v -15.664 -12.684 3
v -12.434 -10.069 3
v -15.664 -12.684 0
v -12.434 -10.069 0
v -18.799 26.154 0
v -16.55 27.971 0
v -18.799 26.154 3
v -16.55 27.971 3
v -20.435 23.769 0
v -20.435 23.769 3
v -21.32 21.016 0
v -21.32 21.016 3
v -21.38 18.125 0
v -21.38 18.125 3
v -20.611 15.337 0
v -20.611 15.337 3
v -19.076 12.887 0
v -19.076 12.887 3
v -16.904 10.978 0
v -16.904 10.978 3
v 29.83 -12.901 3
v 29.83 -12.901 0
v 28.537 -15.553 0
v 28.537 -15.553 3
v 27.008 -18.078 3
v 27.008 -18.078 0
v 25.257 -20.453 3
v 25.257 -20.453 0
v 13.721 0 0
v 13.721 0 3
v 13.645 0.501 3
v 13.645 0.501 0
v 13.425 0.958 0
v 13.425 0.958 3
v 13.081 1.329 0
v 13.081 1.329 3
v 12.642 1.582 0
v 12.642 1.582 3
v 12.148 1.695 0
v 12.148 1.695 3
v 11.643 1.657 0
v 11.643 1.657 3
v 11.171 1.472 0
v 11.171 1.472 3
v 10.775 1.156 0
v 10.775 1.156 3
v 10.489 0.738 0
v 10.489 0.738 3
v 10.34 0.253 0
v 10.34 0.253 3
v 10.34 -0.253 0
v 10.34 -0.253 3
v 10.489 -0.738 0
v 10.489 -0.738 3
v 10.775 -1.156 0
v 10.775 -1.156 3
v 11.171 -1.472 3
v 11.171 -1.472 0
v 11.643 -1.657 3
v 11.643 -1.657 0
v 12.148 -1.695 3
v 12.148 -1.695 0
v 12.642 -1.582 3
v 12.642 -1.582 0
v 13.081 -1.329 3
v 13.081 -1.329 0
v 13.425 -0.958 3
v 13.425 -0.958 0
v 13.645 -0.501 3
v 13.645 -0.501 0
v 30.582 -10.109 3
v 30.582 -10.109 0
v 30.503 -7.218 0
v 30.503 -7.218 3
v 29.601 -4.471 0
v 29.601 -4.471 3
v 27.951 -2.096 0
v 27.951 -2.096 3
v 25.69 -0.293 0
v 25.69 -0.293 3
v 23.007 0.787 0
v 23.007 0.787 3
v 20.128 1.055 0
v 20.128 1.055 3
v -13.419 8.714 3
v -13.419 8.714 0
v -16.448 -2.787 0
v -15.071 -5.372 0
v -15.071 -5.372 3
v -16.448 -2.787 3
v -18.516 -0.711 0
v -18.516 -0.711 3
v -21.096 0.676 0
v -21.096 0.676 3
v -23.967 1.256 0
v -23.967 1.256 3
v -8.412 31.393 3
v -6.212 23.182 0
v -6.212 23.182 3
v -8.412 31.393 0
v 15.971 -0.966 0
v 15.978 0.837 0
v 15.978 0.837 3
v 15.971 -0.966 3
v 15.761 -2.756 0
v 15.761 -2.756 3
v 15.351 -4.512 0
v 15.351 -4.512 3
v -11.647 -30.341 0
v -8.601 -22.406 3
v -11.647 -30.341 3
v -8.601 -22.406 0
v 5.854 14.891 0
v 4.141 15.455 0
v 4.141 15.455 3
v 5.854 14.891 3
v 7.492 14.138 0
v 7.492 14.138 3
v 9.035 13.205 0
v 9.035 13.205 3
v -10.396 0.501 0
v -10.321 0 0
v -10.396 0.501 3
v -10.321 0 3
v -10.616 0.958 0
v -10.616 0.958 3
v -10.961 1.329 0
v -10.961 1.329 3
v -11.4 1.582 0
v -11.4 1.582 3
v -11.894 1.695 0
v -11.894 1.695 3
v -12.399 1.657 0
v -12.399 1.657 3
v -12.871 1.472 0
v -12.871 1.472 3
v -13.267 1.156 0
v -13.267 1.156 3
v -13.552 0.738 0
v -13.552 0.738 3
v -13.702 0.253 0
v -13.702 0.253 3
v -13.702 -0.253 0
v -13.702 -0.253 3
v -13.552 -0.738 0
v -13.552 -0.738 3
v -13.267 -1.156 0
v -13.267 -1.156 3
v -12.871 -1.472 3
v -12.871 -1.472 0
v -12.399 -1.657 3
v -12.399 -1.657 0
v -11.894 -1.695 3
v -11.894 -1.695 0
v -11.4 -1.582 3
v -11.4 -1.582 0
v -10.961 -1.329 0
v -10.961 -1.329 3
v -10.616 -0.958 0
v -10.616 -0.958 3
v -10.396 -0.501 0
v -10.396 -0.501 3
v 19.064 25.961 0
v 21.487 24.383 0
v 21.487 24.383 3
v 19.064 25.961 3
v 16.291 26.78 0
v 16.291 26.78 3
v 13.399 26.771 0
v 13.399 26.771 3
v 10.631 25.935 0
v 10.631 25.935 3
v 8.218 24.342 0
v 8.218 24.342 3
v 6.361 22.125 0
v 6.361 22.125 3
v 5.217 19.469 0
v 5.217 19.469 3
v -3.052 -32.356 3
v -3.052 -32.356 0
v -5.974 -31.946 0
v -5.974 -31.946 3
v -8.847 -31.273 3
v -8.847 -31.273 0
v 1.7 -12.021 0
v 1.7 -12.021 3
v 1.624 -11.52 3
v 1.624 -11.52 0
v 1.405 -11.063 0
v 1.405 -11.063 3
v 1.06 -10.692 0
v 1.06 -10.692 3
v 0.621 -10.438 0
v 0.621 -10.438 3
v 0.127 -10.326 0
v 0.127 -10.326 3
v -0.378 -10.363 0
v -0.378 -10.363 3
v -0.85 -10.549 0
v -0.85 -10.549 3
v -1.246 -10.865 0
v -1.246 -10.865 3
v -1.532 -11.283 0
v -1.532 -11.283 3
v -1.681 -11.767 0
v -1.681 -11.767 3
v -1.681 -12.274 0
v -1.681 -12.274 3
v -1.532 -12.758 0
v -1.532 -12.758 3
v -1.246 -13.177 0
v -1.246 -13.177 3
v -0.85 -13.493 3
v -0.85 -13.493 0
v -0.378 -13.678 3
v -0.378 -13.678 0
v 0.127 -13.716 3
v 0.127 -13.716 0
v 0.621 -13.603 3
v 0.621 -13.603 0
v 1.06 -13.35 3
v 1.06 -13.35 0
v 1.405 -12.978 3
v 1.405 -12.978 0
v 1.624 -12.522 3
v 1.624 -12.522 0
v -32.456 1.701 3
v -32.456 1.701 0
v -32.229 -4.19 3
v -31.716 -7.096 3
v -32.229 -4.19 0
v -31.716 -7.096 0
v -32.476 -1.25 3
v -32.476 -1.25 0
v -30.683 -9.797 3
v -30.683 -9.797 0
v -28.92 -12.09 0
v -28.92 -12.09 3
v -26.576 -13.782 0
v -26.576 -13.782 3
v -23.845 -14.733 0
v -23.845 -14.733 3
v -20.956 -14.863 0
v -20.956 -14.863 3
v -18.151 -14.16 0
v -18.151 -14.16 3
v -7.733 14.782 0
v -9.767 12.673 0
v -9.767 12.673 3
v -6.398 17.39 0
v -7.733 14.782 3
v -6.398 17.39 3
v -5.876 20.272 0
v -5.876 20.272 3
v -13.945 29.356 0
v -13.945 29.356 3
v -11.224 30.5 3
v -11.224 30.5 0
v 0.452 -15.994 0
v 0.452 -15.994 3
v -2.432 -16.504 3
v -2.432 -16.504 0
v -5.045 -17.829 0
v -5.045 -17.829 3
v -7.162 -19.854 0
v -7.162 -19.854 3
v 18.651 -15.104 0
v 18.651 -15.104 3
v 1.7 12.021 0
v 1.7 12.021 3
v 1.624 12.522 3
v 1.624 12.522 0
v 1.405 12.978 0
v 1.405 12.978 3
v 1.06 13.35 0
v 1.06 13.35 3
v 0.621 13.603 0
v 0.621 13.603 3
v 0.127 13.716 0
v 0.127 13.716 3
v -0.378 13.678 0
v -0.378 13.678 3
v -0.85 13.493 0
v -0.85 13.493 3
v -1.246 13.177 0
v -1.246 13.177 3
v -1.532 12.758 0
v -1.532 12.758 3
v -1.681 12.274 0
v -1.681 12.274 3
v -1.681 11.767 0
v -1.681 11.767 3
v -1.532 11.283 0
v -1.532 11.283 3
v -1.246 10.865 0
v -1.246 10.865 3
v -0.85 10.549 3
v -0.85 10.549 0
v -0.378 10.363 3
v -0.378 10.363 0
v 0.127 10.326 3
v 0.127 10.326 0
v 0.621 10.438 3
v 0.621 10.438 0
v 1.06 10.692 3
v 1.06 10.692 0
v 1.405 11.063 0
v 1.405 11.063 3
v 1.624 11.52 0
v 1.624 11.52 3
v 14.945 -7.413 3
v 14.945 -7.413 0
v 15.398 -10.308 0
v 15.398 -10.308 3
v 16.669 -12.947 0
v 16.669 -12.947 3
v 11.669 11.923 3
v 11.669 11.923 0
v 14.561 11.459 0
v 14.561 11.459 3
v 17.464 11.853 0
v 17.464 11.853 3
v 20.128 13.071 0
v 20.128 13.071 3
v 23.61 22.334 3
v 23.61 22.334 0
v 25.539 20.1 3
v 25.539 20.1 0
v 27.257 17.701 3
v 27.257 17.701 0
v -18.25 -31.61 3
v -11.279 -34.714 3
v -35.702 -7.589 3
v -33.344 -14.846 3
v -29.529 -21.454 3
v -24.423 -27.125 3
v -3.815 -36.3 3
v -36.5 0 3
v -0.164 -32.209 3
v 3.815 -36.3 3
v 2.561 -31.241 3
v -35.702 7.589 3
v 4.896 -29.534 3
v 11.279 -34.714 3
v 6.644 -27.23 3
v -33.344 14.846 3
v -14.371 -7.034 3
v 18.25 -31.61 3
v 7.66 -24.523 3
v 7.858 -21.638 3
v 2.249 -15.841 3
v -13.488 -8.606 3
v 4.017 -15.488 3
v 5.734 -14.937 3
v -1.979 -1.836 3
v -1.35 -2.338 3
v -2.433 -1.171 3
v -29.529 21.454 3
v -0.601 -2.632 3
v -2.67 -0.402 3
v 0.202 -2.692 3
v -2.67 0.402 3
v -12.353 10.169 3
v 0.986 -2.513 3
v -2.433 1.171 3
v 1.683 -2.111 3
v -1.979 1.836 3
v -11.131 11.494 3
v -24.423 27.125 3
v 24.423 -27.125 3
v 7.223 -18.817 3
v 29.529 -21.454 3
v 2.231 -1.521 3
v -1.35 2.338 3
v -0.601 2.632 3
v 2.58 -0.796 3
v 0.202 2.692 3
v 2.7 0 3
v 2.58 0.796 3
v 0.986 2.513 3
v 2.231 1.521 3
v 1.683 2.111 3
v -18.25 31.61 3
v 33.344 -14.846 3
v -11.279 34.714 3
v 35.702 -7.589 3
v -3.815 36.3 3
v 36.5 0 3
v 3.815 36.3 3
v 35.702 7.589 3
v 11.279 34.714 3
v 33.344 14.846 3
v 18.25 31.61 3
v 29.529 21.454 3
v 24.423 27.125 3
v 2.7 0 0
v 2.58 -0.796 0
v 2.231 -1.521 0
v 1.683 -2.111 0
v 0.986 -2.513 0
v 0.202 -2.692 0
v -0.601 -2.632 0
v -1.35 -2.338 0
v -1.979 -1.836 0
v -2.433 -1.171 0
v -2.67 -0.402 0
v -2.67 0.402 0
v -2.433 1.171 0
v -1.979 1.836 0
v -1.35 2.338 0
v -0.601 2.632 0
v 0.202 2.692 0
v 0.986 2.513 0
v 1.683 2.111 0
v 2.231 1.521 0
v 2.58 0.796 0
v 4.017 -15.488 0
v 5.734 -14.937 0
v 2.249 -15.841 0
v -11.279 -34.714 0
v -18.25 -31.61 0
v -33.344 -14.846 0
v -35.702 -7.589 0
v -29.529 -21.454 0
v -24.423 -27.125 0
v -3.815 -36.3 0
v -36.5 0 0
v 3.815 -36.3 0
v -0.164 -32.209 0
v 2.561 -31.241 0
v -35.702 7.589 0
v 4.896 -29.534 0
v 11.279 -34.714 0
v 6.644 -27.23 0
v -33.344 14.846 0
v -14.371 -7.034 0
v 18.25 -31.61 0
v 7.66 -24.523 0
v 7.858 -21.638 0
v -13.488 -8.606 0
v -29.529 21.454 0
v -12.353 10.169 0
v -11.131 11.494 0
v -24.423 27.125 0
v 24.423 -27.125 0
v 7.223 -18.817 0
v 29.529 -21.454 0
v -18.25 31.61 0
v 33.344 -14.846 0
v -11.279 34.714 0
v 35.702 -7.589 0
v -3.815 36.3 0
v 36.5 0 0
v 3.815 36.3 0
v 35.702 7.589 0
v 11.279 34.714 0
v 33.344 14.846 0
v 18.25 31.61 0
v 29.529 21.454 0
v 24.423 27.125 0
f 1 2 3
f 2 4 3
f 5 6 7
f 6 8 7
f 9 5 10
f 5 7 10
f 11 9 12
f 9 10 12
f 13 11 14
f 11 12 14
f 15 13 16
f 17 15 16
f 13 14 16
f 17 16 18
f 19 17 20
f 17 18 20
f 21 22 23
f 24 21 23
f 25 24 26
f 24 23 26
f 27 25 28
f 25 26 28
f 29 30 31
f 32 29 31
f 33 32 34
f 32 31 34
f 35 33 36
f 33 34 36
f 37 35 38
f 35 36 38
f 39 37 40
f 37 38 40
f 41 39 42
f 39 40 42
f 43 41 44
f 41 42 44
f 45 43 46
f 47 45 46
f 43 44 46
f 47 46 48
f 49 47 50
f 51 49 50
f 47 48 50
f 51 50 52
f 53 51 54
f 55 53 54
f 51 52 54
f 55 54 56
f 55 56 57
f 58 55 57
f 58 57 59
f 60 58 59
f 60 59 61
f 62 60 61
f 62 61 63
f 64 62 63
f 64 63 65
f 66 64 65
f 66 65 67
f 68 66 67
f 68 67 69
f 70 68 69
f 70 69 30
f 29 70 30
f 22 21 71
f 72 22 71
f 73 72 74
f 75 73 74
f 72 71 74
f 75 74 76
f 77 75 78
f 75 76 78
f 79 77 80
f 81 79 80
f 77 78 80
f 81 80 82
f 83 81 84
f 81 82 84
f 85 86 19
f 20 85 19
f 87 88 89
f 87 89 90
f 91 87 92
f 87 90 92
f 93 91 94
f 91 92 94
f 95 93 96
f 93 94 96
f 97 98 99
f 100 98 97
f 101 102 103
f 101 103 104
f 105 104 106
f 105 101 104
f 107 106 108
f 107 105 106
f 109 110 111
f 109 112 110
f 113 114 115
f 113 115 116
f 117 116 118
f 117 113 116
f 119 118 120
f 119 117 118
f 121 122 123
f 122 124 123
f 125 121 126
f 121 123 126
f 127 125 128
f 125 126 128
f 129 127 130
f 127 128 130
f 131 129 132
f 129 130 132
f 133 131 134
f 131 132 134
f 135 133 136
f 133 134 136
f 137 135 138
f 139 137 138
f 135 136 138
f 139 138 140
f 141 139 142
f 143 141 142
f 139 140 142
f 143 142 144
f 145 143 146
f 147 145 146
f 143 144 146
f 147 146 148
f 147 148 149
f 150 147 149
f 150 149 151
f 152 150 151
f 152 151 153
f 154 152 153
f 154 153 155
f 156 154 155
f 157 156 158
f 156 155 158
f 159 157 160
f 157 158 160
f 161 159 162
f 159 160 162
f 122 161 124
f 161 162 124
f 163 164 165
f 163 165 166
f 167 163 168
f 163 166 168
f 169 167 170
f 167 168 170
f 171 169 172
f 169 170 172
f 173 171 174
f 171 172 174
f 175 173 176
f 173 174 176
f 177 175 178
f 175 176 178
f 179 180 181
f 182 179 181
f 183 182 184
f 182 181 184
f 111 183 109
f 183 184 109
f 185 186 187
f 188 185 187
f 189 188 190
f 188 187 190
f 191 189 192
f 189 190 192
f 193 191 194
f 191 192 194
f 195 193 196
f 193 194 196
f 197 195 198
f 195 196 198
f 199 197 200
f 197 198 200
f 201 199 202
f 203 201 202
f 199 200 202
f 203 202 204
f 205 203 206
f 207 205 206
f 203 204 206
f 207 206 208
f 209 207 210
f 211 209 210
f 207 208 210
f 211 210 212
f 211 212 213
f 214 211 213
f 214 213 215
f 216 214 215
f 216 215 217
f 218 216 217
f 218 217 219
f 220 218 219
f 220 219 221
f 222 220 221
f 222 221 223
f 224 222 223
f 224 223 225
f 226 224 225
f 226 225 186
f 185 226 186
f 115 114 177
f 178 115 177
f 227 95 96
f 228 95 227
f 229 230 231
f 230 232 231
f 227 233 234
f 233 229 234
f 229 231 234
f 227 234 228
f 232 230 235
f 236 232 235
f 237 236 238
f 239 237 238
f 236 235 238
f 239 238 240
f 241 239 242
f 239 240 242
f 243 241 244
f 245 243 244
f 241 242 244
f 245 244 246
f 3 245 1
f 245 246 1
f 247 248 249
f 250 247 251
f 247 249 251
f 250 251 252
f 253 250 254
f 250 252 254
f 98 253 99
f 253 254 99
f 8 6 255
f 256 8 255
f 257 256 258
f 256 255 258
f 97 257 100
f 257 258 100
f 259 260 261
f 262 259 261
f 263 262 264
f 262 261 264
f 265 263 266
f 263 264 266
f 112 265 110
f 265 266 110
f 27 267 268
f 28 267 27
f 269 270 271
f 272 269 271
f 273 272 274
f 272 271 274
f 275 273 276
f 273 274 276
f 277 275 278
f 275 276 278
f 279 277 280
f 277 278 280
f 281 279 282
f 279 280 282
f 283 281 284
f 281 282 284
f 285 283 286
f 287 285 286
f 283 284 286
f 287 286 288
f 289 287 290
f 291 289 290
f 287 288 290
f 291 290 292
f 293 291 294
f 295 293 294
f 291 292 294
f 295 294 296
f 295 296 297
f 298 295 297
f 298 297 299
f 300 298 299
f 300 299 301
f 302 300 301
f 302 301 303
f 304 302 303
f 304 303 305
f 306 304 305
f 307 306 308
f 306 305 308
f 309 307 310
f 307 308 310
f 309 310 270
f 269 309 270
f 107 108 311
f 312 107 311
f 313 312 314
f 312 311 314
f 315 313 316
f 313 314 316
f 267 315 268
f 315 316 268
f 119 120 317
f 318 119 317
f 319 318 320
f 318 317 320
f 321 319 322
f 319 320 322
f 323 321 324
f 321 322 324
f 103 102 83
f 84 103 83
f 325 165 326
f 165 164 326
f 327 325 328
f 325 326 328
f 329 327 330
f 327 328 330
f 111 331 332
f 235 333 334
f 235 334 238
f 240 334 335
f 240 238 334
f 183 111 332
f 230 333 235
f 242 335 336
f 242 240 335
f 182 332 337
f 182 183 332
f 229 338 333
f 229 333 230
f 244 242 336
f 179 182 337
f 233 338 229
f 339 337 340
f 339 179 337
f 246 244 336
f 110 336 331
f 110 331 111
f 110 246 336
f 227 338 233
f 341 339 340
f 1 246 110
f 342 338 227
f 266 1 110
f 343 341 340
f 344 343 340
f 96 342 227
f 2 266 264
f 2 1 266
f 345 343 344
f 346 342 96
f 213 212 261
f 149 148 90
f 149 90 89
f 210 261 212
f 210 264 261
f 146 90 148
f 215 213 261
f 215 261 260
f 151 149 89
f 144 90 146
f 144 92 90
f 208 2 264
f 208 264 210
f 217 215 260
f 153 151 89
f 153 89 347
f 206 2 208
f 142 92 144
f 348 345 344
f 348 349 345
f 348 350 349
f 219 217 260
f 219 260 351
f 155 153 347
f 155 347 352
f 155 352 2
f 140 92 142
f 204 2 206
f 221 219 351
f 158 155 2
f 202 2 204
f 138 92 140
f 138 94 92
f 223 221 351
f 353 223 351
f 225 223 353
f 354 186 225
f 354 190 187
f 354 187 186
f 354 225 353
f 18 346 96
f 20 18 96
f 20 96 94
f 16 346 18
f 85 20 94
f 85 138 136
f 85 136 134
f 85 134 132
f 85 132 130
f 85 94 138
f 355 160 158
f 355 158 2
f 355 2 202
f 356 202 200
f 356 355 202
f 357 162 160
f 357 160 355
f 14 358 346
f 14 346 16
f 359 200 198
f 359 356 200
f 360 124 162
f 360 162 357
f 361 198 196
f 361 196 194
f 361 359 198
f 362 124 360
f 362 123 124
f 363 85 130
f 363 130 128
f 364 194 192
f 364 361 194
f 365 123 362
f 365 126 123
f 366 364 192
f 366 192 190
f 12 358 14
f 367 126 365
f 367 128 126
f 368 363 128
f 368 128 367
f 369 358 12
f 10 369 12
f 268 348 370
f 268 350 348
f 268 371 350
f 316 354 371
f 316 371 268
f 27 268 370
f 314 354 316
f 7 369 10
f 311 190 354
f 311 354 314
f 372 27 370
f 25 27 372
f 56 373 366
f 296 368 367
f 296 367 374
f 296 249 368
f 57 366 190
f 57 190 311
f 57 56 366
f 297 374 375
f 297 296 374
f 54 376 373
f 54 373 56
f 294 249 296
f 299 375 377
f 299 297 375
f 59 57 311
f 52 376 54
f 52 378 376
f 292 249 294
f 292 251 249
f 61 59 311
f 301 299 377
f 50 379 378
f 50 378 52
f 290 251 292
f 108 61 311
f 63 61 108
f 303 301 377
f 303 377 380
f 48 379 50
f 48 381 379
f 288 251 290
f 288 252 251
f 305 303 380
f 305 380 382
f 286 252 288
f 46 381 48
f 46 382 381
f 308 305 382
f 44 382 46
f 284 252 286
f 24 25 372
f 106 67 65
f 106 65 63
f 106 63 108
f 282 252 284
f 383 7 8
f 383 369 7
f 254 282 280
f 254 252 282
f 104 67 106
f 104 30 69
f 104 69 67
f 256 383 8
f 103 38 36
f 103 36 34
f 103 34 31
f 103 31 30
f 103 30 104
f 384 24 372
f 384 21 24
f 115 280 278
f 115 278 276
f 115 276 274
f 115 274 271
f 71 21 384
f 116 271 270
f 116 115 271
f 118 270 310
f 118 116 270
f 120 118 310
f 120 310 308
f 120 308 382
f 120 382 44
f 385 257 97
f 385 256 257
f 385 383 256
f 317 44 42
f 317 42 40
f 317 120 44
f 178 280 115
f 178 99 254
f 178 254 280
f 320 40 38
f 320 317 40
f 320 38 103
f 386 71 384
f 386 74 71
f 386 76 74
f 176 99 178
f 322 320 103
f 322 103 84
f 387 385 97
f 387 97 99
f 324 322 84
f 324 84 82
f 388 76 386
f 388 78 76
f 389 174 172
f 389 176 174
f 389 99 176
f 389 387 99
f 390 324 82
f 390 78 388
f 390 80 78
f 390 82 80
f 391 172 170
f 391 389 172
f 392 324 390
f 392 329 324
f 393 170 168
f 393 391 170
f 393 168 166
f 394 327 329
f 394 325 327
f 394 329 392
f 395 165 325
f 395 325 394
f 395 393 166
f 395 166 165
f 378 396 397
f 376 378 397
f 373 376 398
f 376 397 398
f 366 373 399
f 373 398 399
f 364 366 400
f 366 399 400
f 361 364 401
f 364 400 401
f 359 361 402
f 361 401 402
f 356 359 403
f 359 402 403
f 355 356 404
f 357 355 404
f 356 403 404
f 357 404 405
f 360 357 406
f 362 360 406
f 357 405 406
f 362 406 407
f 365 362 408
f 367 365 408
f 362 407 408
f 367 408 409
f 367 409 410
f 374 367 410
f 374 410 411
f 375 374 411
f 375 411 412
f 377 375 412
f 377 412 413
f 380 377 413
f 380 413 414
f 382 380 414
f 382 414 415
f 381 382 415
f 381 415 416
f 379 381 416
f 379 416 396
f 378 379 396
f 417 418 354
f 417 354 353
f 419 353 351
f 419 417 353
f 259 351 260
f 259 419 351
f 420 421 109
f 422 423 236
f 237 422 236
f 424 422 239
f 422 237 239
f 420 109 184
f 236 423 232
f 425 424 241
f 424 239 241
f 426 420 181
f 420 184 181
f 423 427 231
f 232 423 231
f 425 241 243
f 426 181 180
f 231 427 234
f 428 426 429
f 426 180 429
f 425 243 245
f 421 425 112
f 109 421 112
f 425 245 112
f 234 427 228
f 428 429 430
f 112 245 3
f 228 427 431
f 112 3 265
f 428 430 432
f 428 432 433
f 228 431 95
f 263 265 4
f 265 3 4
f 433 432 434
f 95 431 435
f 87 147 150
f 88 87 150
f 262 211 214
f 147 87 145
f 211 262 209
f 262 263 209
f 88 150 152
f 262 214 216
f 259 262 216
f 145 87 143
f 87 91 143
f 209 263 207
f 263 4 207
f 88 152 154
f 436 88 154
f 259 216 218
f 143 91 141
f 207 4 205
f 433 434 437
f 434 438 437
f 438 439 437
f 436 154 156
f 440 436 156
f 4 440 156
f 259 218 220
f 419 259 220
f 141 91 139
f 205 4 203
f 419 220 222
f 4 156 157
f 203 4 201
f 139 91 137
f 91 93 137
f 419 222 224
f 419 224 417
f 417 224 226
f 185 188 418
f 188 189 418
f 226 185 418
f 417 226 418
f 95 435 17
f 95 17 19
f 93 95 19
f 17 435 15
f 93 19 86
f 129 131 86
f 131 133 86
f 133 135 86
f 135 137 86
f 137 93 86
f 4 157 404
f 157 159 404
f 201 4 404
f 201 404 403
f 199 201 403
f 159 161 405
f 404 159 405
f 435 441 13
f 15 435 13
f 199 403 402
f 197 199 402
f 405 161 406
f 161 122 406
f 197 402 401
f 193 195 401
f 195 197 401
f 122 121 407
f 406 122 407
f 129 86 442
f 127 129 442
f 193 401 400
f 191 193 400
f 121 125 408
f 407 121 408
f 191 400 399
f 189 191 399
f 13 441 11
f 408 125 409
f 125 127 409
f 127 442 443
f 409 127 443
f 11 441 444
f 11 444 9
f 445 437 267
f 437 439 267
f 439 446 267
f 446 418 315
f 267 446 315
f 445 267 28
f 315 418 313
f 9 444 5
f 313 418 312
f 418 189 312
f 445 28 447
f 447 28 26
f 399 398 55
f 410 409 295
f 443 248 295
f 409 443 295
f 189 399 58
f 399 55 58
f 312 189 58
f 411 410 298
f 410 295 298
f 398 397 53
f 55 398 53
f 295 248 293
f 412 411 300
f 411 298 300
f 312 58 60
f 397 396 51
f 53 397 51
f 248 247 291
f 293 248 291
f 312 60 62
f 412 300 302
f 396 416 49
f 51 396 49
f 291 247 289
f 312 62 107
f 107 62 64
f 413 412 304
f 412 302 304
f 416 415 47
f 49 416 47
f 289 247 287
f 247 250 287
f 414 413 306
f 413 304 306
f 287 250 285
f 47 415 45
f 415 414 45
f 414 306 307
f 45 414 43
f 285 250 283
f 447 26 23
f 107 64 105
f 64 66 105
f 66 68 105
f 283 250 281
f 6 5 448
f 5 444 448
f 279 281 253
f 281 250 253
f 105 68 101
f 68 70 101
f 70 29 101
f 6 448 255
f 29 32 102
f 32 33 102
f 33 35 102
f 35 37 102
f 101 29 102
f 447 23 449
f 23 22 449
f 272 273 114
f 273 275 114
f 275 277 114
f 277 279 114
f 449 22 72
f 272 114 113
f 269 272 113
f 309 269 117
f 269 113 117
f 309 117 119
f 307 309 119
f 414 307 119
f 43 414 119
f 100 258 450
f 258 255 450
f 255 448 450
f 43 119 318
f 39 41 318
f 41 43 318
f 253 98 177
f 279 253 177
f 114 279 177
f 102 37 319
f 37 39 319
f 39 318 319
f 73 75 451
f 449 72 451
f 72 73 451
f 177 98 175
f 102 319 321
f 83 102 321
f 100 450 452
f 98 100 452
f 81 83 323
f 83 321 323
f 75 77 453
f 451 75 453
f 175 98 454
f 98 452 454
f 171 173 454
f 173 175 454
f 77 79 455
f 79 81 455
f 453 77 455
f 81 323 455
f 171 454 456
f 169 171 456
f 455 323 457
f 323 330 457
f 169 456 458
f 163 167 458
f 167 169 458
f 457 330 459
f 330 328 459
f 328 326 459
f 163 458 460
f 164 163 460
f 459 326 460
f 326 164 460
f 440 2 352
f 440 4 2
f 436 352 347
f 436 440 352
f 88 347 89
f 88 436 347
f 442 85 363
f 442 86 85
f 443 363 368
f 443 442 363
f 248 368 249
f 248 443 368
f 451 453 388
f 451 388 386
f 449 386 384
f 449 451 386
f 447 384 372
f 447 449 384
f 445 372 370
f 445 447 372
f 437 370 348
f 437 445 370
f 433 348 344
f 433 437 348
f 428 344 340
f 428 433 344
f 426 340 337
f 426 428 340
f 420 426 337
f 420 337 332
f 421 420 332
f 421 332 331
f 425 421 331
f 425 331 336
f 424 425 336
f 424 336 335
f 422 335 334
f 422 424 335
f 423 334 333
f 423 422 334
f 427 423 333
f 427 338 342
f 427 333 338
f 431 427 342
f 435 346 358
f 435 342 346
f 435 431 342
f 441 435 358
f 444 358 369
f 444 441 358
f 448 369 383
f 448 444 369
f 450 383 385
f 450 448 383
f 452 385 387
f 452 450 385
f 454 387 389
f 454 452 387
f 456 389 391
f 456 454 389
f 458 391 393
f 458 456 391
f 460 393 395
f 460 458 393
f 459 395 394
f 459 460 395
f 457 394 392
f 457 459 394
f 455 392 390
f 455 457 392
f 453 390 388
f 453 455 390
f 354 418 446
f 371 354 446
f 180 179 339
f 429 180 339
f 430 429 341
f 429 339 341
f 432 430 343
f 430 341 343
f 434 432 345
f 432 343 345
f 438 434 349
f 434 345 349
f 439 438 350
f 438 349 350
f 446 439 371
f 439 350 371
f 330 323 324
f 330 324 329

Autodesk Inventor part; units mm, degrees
ref_plane "YZ Plane" through (0, 0, 0) normal (1, 0, 0) x (0, 1, 0)
ref_plane "XZ Plane" through (0, 0, 0) normal (0, 1, 0) x (-1, 0, 0)
ref_plane "XY Plane" through (0, 0, 0) normal (0, 0, 1) x (1, 0, 0)
sketch "Sketch1" plane through (0, 0, 0) normal (0, 0, 1) x (1, 0, 0)
  circle A0 centre (0, 0) radius 36.5
  circle A1 centre (0, 0) radius 32.5
  circle A2 centre (0, 0) radius 16
  circle A3 centre (0, 0) radius 2.7
  line L0 (0, 0) -> (-8.4116, 31.3926)
  line L1 (0, 0) -> (8.4116, 31.3926)
  line L2 (0, 0) -> (0, 4.5704)
  line L3 (0, 0) -> (-32.4555, 1.7009)
  line L4 (0, 0) -> (-27.2568, 17.7008)
  line L5 (0, 0) -> (-11.647, -30.3414)
  line L6 (0, 0) -> (-25.2572, -20.4529)
  line L7 (0, 0) -> (25.2572, -20.4529)
  line L8 (0, 0) -> (11.647, -30.3414)
  line L9 (0, 0) -> (27.2568, 17.7008)
  line L10 (0, 0) -> (32.4555, 1.7009)
  point P0 (4.1411, 15.4548)
  point P1 (13.4187, 8.7142)
  point P2 (-4.1411, 15.4548)
  point P3 (-13.4187, 8.7142)
  point P4 (12.4343, -10.0691)
  point P5 (15.9781, 0.8374)
  point P6 (-5.7339, -14.9373)
  point P7 (5.7339, -14.9373)
  point P8 (-15.9781, 0.8374)
  point P9 (-12.4343, -10.0691)
  dimension "d0" = 73
  dimension "d1" = 65
  dimension "d2" = 5.4
  dimension "d3" = 32
  dimension "d4" = 15
  dimension "d5" = 15
  dimension "d8" = 360
extrude "Extrusion1" add sketch "Sketch1" along normal blind 3 contours A0 | L10 A2 L9 A1 | A1 L8 A2 L7 | L10 A3 L9 A2 | A2 L7 A3 L10 | A2 L8 A3 L7 | L1 A2 L0 A1 | L9 A3 L1 A2 | A1 L6 A2 L5 | A2 L5 A3 L8 | L1 A3 L0 A2 | A2 L6 A3 L5 | L4 A2 L3 A1 | L0 A3 L4 A2 | L3 A2 L4 A3 | A3 L6 A2 L3
fillet "Fillet1" radius 10 10 edges at (8.4116, 31.3926, 1.5) (-27.2568, 17.7008, 1.5) (-25.2572, -20.4529, 1.5) (11.647, -30.3414, 1.5) (32.4555, 1.7009, 1.5) (-15.9781, 0.8374, 1.5) (-4.1411, 15.4548, 1.5) (13.4187, 8.7142, 1.5) (12.4343, -10.0691, 1.5) (-5.7339, -14.9373, 1.5)
sketch "Sketch2" plane through (0, 0, 3) normal (0, 0, 1) x (1, 0, 0)
  circle A0 centre (0, 12.0208) radius 1.7
  circle A1 centre (-12.0208, 0) radius 1.7
  circle A2 centre (0, -12.0208) radius 1.7
  circle A3 centre (12.0208, 0) radius 1.7
  line L0 (0, 12.0208) -> (-12.0208, 0)
  line L1 (-12.0208, 0) -> (0, -12.0208)
  line L2 (0, -12.0208) -> (12.0208, 0)
  line L3 (12.0208, 0) -> (0, 12.0208)
  point P0 (0, 0)
  dimension "d13" = 17
  dimension "d14" = 17
  dimension "d15" = 3.4
  dimension "d16" = 3.4
  dimension "d17" = 3.4
  dimension "d18" = 3.4
extrude "Extrusion2" cut sketch "Sketch2" against normal blind 3 contours A0 L3 L0 | L0 L3 A0 | L0 L1 A1 | A1 L1 L0 | L3 L2 A3 | A3 L2 L3 | L1 L2 A2 | A2 L2 L1
properties part number "Wheel_2D_1"
